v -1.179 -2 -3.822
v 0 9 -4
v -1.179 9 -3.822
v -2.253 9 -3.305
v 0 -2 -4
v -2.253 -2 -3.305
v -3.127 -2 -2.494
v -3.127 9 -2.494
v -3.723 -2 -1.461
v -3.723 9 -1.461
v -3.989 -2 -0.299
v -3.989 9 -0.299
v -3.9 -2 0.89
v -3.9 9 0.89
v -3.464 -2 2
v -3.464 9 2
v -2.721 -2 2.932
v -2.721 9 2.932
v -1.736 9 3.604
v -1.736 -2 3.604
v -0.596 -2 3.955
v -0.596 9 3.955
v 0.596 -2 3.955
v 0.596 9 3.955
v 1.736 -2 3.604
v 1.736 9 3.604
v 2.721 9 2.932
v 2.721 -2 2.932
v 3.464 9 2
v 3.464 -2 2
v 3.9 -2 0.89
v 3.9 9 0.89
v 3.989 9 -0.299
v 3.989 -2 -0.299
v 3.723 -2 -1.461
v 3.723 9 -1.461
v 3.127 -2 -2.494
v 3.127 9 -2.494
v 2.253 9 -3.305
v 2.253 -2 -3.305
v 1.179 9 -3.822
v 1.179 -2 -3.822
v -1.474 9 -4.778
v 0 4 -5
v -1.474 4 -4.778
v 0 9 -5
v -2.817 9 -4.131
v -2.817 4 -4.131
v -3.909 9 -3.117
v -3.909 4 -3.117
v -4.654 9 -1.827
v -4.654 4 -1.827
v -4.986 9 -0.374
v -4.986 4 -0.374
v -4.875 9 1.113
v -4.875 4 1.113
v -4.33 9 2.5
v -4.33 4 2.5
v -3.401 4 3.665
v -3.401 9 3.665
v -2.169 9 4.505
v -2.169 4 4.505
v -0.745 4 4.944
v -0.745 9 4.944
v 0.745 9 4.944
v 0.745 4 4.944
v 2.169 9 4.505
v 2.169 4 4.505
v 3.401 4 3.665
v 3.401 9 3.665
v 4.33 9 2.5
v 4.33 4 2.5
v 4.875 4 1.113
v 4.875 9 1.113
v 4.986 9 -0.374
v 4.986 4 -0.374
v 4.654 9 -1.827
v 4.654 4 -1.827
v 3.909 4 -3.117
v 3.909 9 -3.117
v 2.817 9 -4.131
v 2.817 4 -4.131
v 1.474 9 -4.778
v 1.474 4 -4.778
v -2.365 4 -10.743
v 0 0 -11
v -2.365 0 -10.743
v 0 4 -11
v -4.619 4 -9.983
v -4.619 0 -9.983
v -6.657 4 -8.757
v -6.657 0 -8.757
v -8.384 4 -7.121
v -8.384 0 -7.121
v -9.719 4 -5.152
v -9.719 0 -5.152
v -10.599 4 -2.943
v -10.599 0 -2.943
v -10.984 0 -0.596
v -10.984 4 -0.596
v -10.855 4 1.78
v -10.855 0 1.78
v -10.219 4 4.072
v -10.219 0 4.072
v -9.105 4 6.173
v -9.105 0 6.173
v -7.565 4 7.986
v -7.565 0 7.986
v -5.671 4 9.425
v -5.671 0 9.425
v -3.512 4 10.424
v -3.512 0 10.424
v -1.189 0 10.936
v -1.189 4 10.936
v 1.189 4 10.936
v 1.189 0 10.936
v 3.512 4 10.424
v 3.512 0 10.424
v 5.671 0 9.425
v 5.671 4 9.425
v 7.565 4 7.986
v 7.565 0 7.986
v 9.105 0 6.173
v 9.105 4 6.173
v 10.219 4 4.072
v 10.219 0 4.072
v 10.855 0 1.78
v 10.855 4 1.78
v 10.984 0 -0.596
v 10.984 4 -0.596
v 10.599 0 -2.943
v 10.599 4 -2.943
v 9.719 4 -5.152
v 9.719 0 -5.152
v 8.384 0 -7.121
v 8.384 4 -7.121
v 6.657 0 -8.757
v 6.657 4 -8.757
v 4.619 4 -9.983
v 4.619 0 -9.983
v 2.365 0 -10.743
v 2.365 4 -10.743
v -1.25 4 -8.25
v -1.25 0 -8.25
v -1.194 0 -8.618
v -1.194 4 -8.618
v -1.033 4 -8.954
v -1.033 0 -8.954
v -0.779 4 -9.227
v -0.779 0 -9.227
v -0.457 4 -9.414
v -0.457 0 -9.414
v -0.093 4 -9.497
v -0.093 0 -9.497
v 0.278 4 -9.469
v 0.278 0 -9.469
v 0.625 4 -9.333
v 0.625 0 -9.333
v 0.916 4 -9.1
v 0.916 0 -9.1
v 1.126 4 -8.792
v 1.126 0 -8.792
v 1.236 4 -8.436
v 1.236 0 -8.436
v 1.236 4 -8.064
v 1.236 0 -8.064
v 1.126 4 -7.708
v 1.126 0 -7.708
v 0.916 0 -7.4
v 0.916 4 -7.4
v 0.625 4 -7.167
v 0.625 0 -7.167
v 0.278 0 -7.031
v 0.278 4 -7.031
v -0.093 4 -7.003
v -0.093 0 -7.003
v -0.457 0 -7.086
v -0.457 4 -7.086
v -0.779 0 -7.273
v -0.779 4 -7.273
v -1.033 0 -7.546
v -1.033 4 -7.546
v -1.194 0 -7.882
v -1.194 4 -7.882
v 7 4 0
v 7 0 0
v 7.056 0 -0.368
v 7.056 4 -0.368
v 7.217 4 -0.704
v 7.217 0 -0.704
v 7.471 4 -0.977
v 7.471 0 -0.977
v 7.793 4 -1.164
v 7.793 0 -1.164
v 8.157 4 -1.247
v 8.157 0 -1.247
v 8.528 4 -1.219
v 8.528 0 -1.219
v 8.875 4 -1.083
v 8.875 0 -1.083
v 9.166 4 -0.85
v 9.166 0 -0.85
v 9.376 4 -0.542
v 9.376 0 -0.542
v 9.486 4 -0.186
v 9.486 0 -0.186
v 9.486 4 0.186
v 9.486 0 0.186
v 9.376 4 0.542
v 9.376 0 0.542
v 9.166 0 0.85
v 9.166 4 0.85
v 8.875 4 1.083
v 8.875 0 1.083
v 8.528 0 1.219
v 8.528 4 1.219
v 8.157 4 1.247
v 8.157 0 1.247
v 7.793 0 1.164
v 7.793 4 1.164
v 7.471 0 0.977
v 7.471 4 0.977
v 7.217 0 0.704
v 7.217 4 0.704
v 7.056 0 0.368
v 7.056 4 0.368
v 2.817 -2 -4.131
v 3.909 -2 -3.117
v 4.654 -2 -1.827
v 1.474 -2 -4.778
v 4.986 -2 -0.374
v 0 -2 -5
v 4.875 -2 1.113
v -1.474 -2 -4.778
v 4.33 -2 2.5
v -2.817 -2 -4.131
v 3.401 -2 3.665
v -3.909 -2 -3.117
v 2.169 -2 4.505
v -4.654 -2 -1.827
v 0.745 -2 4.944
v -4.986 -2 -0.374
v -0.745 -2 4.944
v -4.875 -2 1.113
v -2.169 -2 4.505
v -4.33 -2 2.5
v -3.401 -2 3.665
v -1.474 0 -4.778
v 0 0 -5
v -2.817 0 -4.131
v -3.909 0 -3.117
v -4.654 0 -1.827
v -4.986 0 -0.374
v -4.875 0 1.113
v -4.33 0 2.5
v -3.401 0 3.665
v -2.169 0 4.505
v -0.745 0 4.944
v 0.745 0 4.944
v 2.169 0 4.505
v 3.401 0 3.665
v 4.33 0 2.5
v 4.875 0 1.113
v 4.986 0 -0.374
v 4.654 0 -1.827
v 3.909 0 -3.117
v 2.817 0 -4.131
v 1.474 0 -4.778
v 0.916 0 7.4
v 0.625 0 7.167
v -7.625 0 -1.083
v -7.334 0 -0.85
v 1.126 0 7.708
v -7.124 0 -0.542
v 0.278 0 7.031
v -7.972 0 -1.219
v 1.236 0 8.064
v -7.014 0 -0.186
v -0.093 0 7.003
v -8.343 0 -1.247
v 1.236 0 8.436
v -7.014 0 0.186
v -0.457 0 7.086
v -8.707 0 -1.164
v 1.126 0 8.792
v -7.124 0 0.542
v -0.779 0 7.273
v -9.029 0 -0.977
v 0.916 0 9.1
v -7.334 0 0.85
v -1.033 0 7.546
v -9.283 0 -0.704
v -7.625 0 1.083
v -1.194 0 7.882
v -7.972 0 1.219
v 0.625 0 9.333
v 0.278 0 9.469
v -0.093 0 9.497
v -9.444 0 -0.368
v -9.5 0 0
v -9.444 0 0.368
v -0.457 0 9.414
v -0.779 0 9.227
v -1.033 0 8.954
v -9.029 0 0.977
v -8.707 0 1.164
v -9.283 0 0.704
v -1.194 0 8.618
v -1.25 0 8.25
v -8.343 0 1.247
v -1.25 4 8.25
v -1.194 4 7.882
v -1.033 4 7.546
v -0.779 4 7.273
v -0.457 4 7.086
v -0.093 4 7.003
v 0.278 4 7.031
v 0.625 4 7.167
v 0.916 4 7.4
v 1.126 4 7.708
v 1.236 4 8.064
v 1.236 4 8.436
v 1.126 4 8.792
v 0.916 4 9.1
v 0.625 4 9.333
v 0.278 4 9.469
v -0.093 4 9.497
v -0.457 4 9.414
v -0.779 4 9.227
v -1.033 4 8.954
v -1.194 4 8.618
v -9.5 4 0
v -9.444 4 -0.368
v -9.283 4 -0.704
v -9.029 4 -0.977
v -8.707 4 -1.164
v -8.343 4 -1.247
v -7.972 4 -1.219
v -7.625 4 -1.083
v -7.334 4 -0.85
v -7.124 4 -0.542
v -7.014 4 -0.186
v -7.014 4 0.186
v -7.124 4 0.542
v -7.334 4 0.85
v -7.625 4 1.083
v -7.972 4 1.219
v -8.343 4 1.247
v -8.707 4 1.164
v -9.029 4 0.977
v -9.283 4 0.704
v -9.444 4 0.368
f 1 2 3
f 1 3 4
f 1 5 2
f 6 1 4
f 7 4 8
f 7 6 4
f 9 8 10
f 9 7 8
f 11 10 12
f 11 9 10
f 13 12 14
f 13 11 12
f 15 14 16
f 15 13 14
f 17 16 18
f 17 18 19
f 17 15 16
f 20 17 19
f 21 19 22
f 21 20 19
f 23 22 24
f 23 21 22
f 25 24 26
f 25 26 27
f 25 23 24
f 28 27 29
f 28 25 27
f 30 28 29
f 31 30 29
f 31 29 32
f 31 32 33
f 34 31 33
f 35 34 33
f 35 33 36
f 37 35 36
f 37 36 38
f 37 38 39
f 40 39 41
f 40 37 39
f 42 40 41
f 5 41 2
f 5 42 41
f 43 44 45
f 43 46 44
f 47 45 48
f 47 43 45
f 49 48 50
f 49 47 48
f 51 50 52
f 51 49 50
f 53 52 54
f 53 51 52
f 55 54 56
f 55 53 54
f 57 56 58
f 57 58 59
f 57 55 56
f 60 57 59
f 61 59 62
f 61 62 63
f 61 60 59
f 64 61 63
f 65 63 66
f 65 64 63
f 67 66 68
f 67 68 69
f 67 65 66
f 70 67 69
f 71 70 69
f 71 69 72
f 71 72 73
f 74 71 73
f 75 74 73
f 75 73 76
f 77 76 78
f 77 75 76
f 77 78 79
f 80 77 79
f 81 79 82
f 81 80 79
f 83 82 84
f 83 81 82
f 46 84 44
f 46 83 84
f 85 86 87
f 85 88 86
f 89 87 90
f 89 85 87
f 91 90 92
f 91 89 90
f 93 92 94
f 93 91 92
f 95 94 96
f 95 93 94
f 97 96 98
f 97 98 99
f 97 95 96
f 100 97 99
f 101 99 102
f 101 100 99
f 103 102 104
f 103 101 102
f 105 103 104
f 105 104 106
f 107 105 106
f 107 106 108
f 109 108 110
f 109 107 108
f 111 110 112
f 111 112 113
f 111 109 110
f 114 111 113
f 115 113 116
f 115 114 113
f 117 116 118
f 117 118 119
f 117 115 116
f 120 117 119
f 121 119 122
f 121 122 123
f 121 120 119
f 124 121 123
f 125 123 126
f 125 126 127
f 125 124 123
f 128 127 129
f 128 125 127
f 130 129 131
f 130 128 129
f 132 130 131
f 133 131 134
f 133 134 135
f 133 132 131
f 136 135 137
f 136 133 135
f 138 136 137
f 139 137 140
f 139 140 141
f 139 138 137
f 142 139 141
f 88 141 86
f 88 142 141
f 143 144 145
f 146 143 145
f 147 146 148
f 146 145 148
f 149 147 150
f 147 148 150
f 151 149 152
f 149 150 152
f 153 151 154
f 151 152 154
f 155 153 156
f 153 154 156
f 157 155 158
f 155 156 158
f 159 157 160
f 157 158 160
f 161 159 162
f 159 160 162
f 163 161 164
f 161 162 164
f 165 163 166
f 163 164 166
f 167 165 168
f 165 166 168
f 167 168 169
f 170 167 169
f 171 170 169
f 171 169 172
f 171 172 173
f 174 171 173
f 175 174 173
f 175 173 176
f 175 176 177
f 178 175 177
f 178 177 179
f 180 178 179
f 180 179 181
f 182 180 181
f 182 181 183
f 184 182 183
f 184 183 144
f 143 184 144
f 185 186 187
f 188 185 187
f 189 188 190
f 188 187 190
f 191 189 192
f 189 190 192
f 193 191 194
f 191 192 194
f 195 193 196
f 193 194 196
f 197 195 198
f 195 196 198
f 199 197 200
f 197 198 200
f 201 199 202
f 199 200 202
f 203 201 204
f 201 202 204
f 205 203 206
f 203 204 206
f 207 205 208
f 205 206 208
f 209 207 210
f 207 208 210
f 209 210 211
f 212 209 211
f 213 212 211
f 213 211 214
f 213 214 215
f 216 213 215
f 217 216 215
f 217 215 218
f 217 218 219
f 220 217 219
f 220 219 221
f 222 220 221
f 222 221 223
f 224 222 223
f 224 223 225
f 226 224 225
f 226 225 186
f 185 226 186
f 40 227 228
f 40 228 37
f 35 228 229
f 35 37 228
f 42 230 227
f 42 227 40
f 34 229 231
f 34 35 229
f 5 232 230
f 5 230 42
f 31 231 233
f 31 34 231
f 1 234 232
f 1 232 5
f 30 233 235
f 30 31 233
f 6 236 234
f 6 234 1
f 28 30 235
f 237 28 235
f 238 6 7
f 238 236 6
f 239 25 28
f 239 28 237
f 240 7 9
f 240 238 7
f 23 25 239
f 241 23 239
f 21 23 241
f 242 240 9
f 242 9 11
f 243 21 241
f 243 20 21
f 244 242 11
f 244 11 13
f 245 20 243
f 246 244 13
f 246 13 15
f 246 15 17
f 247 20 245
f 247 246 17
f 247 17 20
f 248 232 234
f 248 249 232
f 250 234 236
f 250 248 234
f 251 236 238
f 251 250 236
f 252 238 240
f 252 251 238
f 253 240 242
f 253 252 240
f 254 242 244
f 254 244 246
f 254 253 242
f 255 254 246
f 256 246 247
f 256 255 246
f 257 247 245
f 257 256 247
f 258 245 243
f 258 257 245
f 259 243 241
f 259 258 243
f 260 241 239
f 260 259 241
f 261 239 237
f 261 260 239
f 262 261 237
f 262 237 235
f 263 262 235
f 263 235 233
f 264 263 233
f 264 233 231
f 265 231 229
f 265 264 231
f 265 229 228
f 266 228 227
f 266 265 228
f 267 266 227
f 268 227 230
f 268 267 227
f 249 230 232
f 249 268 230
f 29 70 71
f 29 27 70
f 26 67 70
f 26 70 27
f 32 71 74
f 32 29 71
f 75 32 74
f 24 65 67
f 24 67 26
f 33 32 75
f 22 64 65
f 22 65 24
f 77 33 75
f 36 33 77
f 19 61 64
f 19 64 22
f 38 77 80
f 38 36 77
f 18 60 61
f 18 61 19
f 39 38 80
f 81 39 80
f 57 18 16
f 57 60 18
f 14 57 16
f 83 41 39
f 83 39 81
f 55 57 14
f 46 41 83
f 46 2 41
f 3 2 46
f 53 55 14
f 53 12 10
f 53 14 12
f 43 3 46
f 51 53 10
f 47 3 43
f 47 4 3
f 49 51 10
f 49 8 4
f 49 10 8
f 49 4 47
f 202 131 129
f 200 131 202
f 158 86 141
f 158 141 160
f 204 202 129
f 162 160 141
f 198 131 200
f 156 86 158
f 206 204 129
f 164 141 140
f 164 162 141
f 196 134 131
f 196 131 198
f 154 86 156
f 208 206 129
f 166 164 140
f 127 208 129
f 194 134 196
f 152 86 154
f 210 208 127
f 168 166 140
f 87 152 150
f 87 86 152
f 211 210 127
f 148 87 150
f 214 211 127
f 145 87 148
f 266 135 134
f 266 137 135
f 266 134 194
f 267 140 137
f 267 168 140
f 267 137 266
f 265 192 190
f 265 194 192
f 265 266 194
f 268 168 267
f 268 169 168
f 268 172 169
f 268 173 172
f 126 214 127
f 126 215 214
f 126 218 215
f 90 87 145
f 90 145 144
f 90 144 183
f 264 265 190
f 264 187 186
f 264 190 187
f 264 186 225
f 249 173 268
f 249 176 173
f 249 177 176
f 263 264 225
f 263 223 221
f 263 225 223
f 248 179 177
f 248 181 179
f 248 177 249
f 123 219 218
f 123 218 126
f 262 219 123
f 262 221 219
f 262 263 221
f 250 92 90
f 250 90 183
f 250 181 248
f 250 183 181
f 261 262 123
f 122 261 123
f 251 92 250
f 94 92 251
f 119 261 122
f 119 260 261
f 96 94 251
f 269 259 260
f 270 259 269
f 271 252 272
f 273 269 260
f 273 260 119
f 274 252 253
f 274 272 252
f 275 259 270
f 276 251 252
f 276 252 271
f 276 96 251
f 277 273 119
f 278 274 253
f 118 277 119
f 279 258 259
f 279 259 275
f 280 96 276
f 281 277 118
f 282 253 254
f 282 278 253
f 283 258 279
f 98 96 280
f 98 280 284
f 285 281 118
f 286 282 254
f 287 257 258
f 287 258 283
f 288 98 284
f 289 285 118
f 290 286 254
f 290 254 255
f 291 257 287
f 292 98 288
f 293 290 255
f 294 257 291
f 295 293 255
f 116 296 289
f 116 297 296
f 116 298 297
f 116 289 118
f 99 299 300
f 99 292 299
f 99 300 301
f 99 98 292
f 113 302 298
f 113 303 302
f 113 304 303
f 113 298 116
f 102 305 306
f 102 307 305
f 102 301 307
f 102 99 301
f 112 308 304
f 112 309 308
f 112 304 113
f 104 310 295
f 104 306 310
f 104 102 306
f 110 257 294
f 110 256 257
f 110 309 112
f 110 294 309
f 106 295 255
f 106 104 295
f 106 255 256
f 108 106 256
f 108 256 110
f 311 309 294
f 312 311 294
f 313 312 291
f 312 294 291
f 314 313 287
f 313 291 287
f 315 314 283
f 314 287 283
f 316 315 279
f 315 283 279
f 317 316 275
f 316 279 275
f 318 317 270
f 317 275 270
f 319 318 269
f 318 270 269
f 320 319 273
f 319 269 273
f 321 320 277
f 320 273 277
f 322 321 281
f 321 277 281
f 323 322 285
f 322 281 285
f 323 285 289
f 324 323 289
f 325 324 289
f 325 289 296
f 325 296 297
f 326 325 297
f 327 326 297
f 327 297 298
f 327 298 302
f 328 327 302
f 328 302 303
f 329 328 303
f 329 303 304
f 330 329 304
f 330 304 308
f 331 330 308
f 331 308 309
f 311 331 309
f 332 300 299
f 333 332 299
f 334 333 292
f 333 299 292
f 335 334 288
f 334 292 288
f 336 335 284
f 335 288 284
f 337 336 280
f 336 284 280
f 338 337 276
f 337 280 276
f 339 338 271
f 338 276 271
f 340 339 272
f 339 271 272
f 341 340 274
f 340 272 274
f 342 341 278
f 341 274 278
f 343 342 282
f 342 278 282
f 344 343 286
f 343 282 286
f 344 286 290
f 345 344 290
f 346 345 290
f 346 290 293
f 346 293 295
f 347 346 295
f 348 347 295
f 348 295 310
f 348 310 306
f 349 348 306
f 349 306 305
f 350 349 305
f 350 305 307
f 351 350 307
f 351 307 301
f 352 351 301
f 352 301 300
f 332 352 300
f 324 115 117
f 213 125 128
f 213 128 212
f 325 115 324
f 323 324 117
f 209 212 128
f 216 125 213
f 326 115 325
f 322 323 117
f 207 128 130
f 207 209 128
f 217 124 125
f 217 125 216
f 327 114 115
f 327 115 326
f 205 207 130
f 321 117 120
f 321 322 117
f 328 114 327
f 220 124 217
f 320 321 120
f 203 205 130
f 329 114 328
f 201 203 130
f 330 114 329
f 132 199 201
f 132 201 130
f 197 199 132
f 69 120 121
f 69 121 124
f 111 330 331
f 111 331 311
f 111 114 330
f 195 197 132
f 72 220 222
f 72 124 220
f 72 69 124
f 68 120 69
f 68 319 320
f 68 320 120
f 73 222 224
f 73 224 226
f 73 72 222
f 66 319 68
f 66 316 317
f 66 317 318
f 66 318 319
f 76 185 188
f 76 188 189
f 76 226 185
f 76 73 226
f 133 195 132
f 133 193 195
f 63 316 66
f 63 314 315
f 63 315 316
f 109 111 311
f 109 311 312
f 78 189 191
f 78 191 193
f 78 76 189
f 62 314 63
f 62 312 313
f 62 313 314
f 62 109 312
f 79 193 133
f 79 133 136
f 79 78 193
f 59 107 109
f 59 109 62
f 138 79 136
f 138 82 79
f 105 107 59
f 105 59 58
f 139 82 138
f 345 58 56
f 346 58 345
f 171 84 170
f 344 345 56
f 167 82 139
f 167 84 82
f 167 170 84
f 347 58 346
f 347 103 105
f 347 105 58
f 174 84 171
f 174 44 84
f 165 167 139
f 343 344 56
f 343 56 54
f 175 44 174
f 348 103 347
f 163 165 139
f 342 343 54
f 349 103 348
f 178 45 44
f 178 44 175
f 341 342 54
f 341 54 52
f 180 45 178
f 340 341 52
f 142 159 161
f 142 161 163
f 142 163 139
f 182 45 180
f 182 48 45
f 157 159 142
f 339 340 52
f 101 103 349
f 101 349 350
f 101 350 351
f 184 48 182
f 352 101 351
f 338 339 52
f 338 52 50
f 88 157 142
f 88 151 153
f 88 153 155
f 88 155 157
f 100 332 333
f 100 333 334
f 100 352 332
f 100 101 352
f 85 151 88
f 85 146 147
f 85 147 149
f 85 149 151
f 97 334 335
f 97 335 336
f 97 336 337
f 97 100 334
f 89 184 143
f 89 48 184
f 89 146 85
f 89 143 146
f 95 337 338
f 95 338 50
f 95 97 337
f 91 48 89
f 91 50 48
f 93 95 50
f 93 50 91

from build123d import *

# Parameters (mm, degrees)
TAP_DRILL_FOR_M3_TAP1_D = 2.5


with BuildPart() as part:
    # Sketch1 → Revolve1 (revolve)
    with BuildSketch(Plane.XY, mode=Mode.PRIVATE) as revolve1_sk:
        Polygon((11, 0), (11, 4), (5, 4), (5, 9), (4, 9), (4, -2), (5, -2), (5, 0), align=None)
    revolve(revolve1_sk.sketch.rotate(Axis((0, 0, 0), (0, 1, 0)), 90), axis=Axis((0, 0, 0), (0, 1, 0)))

    # Tap Drill for M3 Tap1 (through all)
    with Locations(Plane(origin=(0, 4, 0), x_dir=(1, 0, 0), z_dir=(0, 1, 0))):
        with Locations((0, 8.25), (8.25, 0), (0, -8.25), (-8.25, 0)):
            Hole(TAP_DRILL_FOR_M3_TAP1_D / 2)


solid = part.part
